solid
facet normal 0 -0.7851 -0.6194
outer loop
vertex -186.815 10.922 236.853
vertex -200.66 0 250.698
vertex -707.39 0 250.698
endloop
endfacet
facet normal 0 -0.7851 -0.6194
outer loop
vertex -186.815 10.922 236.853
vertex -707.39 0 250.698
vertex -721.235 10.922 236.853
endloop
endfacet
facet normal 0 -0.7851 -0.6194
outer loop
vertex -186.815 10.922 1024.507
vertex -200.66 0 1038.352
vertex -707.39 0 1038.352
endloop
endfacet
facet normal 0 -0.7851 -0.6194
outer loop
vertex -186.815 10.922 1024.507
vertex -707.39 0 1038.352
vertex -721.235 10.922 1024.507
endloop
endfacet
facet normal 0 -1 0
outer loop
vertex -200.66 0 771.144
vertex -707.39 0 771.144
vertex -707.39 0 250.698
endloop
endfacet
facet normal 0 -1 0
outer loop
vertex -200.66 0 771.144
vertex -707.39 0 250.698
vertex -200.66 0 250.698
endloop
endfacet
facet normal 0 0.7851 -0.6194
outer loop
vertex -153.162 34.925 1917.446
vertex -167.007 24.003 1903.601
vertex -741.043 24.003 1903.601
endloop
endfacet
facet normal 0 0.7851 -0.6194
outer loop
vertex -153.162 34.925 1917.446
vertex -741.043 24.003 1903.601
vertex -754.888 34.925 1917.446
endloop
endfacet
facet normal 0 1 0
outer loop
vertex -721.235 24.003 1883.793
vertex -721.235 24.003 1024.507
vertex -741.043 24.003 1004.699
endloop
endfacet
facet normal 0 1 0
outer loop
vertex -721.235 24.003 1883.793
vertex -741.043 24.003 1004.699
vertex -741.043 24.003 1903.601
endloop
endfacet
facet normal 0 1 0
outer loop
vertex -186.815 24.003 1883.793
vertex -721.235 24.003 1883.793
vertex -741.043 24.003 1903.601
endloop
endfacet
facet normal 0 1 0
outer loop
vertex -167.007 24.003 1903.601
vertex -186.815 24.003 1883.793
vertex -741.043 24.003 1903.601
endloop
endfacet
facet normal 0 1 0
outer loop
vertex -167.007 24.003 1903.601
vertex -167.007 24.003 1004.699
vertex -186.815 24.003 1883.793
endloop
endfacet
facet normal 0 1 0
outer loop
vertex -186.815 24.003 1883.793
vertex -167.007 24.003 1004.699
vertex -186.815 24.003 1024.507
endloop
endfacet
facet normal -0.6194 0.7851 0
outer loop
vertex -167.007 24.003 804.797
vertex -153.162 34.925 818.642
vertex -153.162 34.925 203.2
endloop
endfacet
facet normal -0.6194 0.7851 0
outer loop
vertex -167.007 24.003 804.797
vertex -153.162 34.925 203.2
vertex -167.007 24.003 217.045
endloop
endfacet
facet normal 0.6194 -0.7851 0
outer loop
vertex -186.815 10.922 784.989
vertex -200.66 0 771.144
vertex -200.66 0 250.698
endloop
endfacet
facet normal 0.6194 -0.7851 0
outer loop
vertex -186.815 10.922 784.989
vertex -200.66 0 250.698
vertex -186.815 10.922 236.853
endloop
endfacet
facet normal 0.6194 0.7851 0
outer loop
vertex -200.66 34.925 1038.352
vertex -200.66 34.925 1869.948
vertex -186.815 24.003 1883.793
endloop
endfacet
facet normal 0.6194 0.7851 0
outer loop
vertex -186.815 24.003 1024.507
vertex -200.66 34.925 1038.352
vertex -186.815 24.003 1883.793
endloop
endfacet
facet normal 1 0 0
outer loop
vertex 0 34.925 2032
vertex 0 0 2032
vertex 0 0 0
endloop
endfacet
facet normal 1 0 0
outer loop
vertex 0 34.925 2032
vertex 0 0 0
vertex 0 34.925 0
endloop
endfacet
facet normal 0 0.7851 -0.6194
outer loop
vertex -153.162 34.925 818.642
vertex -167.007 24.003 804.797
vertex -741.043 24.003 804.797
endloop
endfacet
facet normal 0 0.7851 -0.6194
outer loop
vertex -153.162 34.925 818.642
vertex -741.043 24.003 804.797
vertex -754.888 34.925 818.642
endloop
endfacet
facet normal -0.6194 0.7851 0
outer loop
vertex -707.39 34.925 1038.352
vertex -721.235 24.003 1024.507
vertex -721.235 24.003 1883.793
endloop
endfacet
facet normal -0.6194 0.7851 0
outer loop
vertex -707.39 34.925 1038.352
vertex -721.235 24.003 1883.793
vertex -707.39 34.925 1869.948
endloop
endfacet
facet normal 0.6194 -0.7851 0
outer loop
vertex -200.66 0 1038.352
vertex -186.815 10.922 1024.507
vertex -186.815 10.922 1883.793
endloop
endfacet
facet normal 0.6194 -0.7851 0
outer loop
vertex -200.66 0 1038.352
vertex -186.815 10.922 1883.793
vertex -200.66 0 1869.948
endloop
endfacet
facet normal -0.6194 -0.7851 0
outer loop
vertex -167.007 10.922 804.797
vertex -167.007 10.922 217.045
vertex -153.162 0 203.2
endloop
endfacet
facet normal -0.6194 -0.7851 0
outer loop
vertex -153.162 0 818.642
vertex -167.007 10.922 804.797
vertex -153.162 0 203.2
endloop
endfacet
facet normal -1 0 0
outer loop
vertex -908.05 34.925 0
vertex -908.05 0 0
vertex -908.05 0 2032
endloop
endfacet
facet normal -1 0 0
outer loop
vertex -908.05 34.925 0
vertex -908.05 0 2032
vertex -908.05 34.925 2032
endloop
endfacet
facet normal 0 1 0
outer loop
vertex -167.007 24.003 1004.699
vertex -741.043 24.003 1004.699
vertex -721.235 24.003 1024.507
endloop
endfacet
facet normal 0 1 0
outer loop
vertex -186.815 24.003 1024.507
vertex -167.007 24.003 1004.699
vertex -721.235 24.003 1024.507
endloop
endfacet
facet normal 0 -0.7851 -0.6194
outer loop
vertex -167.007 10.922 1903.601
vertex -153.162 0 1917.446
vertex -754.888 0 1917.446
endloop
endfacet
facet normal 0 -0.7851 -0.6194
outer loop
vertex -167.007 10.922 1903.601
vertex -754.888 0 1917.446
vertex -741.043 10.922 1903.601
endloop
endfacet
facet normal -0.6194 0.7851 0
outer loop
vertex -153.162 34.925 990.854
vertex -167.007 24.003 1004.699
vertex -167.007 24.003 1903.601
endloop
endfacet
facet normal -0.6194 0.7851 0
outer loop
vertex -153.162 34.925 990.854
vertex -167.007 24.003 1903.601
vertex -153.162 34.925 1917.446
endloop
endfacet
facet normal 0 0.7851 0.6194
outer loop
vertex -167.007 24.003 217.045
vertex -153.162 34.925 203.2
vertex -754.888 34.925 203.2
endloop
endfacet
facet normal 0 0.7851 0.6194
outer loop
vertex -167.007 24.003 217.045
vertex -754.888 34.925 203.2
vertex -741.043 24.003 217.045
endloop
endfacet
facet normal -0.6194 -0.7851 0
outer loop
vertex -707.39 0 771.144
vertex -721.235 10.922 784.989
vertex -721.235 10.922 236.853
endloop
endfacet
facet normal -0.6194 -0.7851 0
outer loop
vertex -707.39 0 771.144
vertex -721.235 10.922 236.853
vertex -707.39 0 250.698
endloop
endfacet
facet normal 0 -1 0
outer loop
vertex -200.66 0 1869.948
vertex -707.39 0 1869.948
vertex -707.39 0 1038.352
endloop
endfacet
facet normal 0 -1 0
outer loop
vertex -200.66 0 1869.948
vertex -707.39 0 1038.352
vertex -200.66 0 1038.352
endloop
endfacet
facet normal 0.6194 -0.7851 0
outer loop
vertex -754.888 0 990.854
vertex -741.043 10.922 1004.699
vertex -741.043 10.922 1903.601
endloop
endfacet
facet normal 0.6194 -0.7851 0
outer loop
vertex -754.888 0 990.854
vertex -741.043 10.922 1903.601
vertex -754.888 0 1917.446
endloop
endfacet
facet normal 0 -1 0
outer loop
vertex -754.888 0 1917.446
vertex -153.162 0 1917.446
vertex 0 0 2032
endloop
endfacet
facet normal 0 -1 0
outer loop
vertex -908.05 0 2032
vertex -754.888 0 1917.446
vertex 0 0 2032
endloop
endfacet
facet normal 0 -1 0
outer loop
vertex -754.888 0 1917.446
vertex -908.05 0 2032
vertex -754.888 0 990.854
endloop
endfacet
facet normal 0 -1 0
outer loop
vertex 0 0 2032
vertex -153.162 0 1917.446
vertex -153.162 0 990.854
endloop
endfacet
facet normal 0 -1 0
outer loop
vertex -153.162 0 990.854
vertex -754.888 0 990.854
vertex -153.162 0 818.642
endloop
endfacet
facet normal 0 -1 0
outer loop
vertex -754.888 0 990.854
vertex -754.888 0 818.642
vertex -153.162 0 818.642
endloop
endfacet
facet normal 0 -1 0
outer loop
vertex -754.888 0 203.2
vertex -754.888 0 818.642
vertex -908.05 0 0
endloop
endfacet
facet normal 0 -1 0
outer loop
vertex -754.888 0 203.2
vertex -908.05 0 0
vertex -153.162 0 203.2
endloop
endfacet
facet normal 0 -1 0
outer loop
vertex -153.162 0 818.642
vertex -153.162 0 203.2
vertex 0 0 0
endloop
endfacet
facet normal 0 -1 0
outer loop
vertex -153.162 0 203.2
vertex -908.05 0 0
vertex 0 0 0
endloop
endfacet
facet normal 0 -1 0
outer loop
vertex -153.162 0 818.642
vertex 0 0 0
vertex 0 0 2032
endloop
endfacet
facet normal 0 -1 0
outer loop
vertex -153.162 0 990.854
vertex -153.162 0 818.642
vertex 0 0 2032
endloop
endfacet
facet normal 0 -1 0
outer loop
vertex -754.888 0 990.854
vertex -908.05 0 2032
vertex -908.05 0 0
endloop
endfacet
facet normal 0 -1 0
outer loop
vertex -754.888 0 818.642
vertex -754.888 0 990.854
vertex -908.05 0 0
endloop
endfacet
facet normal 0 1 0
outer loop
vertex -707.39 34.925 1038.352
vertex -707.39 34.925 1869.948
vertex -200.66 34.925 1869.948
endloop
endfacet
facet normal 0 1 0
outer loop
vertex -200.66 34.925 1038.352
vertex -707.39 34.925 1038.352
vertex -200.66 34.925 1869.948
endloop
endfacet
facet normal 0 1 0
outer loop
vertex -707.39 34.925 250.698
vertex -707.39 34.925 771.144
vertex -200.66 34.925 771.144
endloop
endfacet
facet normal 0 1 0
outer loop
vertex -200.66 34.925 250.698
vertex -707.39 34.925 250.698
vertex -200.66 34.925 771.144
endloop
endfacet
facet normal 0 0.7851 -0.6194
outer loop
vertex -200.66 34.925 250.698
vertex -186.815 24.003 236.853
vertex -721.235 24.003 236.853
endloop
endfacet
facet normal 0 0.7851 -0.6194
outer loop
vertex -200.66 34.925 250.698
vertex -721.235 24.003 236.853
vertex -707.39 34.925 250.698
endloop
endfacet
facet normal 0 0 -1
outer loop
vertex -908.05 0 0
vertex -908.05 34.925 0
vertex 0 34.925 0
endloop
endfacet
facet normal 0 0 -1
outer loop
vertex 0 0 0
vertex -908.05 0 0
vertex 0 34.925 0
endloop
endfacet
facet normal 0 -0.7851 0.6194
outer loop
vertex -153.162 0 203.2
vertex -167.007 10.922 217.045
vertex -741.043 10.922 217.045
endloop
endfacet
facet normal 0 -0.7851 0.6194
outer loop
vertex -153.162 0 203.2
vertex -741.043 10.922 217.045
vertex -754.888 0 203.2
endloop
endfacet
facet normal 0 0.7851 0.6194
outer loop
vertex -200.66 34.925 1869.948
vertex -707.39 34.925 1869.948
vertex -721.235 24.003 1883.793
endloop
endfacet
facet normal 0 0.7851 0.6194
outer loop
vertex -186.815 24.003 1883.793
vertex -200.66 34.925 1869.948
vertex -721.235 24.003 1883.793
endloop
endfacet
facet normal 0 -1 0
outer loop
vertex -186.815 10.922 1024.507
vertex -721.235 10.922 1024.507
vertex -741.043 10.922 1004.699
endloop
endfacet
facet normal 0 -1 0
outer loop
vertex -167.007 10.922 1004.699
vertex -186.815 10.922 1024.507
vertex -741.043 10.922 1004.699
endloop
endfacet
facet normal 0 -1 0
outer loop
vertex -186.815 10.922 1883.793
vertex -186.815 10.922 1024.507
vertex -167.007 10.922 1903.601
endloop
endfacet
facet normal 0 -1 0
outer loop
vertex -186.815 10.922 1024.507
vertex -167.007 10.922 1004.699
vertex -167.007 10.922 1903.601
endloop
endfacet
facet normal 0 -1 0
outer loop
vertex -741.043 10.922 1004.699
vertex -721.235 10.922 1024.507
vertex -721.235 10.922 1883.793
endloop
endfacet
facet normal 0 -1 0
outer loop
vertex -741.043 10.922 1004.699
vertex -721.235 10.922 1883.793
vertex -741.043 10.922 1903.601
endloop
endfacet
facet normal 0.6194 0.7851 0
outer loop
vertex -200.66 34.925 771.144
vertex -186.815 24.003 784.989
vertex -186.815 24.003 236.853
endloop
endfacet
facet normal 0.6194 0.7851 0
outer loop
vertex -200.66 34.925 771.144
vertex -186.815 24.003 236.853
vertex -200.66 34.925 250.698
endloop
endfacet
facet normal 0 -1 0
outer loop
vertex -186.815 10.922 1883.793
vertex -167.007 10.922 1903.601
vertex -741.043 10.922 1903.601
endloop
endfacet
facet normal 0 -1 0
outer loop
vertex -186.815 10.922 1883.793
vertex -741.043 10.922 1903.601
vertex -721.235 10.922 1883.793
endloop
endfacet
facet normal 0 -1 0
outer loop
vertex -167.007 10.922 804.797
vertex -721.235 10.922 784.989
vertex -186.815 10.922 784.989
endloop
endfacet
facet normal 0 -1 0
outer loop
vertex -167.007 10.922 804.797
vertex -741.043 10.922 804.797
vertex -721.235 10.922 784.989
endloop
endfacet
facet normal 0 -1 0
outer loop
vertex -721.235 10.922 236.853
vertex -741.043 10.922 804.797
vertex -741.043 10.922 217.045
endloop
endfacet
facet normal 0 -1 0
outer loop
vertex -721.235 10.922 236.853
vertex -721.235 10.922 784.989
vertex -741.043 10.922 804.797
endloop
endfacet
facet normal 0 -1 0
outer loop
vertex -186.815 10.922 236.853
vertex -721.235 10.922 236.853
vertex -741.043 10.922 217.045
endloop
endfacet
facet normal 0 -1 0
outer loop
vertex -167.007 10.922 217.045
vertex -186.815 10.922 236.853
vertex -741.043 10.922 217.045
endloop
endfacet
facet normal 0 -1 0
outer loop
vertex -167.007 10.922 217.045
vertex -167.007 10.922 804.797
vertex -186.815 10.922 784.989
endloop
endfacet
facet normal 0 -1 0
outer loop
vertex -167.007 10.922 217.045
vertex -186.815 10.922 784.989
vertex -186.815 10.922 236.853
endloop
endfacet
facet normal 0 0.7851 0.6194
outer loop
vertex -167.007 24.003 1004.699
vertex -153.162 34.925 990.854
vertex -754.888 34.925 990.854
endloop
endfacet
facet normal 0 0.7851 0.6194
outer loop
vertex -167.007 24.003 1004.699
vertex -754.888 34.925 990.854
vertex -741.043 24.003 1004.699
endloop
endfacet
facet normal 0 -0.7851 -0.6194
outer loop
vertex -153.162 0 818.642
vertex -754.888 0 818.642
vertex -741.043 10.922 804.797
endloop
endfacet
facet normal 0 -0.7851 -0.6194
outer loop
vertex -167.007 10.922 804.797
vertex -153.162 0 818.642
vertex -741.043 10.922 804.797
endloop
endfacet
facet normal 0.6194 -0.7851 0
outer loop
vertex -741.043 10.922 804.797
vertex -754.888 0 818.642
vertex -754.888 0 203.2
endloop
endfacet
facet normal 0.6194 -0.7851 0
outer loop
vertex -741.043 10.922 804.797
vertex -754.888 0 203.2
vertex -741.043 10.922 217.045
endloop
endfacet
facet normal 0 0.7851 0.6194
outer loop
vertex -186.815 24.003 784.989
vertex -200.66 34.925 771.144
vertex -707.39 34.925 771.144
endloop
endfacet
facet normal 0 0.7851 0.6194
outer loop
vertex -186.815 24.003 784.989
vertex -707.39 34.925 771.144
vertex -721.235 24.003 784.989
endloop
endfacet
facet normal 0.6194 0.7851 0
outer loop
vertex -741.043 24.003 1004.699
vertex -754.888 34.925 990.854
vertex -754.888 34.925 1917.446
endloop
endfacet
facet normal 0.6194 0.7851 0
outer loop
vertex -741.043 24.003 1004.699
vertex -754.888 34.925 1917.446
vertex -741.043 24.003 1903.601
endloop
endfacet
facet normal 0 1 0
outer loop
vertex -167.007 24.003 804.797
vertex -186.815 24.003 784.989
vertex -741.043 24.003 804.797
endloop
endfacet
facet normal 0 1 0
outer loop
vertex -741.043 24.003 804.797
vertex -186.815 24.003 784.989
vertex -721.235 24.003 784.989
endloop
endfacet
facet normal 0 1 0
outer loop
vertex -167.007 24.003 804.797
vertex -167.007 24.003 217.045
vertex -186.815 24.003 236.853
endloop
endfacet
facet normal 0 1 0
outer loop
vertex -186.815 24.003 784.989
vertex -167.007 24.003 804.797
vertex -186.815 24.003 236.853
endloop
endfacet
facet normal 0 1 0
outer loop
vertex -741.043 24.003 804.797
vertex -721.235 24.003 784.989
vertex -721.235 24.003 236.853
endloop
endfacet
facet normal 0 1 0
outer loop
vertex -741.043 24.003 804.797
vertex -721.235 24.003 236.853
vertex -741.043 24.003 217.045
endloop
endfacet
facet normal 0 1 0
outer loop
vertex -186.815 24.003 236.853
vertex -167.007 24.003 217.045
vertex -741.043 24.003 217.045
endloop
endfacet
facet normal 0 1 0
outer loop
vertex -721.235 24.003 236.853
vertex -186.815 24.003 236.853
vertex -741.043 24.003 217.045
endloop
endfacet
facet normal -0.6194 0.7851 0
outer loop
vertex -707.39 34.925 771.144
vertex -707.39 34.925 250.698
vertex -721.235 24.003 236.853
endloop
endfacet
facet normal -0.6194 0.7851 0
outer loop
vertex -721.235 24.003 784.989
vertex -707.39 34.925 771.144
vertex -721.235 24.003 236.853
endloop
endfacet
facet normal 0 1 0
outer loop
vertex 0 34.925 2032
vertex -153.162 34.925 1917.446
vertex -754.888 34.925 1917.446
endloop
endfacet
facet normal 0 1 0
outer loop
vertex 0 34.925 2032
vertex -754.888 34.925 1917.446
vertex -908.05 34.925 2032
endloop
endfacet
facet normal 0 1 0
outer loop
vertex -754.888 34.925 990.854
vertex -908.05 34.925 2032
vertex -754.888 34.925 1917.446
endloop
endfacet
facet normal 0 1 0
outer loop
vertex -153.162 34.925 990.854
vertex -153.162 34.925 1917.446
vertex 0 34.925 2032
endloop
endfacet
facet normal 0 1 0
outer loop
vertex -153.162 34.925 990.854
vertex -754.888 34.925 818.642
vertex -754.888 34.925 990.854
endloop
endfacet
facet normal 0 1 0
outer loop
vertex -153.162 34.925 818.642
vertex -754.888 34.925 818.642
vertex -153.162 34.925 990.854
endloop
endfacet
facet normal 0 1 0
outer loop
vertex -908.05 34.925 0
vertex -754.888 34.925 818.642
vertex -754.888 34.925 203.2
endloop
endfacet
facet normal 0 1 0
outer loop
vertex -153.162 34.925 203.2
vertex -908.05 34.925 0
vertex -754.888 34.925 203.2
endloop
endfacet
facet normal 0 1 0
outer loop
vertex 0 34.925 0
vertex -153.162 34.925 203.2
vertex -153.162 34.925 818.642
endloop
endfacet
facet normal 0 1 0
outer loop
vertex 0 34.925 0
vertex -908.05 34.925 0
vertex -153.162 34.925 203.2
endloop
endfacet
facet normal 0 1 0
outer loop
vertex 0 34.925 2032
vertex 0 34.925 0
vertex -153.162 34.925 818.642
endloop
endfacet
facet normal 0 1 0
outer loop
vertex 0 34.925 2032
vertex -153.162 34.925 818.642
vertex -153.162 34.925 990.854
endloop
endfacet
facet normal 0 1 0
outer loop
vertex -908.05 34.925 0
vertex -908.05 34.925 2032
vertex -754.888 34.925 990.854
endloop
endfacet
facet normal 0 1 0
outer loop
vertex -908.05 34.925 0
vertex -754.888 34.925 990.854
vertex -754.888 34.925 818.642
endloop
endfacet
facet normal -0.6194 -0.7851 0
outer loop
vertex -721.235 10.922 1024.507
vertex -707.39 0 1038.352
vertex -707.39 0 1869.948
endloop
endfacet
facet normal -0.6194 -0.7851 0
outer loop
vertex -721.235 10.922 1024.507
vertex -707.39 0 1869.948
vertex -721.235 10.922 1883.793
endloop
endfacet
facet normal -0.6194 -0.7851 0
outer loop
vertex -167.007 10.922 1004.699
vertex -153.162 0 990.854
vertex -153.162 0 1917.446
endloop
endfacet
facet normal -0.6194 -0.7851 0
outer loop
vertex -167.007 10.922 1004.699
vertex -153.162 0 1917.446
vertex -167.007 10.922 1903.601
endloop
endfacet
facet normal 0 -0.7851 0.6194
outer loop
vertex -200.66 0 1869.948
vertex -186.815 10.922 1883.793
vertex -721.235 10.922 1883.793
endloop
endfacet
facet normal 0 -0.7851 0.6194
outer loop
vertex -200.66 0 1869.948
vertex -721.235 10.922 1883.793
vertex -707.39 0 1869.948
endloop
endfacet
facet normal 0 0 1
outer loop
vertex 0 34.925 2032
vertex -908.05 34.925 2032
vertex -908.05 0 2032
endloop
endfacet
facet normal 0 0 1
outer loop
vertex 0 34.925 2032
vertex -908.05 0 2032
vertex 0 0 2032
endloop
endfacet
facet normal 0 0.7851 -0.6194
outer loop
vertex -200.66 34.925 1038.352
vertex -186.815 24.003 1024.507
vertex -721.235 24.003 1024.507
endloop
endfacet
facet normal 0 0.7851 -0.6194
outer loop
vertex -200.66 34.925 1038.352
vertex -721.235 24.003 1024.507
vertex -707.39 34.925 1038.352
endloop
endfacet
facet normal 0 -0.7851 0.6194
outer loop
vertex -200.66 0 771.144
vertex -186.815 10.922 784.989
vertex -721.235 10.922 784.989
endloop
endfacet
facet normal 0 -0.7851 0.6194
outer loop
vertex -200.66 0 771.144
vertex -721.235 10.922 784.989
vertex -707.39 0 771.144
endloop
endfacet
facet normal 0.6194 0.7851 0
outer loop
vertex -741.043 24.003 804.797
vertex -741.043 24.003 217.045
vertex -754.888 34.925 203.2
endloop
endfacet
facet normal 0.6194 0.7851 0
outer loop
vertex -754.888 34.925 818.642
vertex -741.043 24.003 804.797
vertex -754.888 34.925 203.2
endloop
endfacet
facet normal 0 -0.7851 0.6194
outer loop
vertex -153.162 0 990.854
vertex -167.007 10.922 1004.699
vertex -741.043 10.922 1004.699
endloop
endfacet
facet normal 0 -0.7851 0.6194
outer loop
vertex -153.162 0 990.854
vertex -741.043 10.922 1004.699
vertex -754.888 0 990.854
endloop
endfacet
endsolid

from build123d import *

# Parameters (mm, degrees)
F0_W      = 908.05
F0_H      = 34.925
F1_DEPTH  = 2032
F2_W      = 601.726
F2_H      = 615.442
F3_DEPTH  = 34.926
F8_DEPTH  = 926.592
F9_DEPTH  = 615.442
F11_DEPTH = 34.926
F13_DEPTH = 908.05
F15_DEPTH = 34.926
F17_W     = 506.7300000006
F17_H     = 34.925
F18_DEPTH = 831.596
F19_W     = 506.7300000008
F19_H     = 34.925
F20_DEPTH = 520.446


with BuildPart() as f1:
    # F0 (on Top) → F1 (new body)
    with BuildSketch(Plane.XY):
        with Locations((-454.025, 17.4625)):
            Rectangle(F0_W, F0_H)
    extrude(amount=F1_DEPTH)

    # F2 (on Front) → F3 (cut, through all)
    with BuildSketch(Plane.XZ):
        Polygon((-754.888, 1917.446), (-754.888, 990.854), (-153.162, 990.854), (-153.162, 1917.446), (-454.025, 1917.446), align=None)
        with Locations((-454.025, 510.921)):
            Rectangle(F2_W, F2_H)
    extrude(amount=-F3_DEPTH, mode=Mode.SUBTRACT)

    # F6 (on face) → F8 (join, through all)
    with BuildSketch(Plane(origin=(0, 0, 1917.446), x_dir=(1, 0, 0), z_dir=(0, 0, -1))):
        Polygon((-200.66, -17.4625), (-200.66, -34.925), (-186.8149014921, -24.003), (-176.911, -24.003), (-167.0070985079, -24.003), (-153.162, -34.925), (-153.162, -17.4625), (-153.162, 0), (-167.0070985079, -10.922), (-176.911, -10.922), (-186.8149014921, -10.922), (-200.66, 0), align=None)
        Polygon((-741.0429014921, -24.003), (-731.139, -24.003), (-721.2350985079, -24.003), (-707.39, -34.925), (-707.39, -17.4625), (-707.39, 0), (-721.2350985079, -10.922), (-731.139, -10.922), (-741.0429014921, -10.922), (-754.888, 0), (-754.888, -17.4625), (-754.888, -34.925), align=None)
    extrude(amount=F8_DEPTH)

    # F7 (on face) → F9 (join, through all)
    with BuildSketch(Plane.XY.offset(203.2)):
        Polygon((-200.66, 34.925), (-200.66, 17.4625), (-200.66, 0), (-186.8149014921, 10.922), (-176.911, 10.922), (-167.0070985079, 10.922), (-153.162, 0), (-153.162, 17.4625), (-153.162, 34.925), (-167.0070985079, 24.003), (-176.911, 24.003), (-186.8149014921, 24.003), align=None)
        Polygon((-721.2350985079, 24.003), (-731.139, 24.003), (-741.0429014921, 24.003), (-754.888, 34.925), (-754.888, 17.4625), (-754.888, 0), (-741.0429014921, 10.922), (-731.139, 10.922), (-721.2350985079, 10.922), (-707.39, 0), (-707.39, 17.4625), (-707.39, 34.925), align=None)
    extrude(amount=F9_DEPTH)

    # F10 (on Front) → F11 (cut, through all)
    with BuildSketch(Plane.XZ):
        Polygon((-754.888, 1917.446), (-454.025, 1616.583), (-153.162, 1917.446), (-200.66, 1917.446), (-707.39, 1917.446), align=None)
        Polygon((-153.162, 990.854), (-454.025, 1291.717), (-754.888, 990.854), (-200.66, 990.854), align=None)
        Polygon((-153.162, 818.642), (-200.66, 818.642), (-707.39, 818.642), (-754.888, 818.642), (-454.025, 517.779), align=None)
        Polygon((-754.888, 203.2), (-200.66, 203.2), (-153.162, 203.2), (-454.025, 504.063), align=None)
    extrude(amount=-F11_DEPTH, mode=Mode.SUBTRACT)


with BuildPart() as f13:
    # F12 (on Right) → F13 (new body, through all)
    with BuildSketch(Plane.YZ):
        Polygon((34.925, 1917.446), (0, 1917.446), (10.9219999999, 1903.6009014923), (10.922, 1883.7930985079), (0, 1869.948), (34.925, 1869.948), (24.003, 1883.793098508), (24.003, 1903.6009014921), align=None)
    extrude(amount=-F13_DEPTH)


with BuildPart() as f13b:
    # F12 (on Right) → F13, piece 2 (new body, through all)
    with BuildSketch(Plane.YZ):
        Polygon((10.922, 1004.6990985079), (0, 990.854), (34.925, 990.854), (24.0029999999, 1004.6990985081), (24.003, 1024.5069014921), (34.925, 1038.3520000001), (0, 1038.352), (10.922, 1024.5069014922), align=None)
    extrude(amount=-F13_DEPTH)


with BuildPart() as f13c:
    # F12 (on Right) → F13, piece 3 (new body, through all)
    with BuildSketch(Plane.YZ):
        Polygon((24.003, 784.9890985079), (24.003, 804.7969014922), (34.925, 818.642), (0, 818.642), (10.922, 804.796901492), (10.922, 784.9890985079), (1e-10, 771.1440000001), (34.925, 771.144), align=None)
    extrude(amount=-F13_DEPTH)


with BuildPart() as f13d:
    # F12 (on Right) → F13, piece 4 (new body, through all)
    with BuildSketch(Plane.YZ):
        Polygon((34.925, 203.2), (24.003, 217.0450985079), (24.003, 236.852901492), (34.925, 250.698), (0, 250.698), (10.922, 236.8529014921), (10.922, 217.0450985078), (0, 203.2), align=None)
    extrude(amount=-F13_DEPTH)


with BuildPart() as f15_tool:
    # F14 (on Front) → F15 (new body, through all)
    with BuildSketch(Plane.XZ):
        Polygon((-754.888, 818.642), (-754.888, 203.2), (-454.025, 504.063), (-153.162, 203.2), (-153.162, 818.642), (-454.025, 517.779), align=None)
        Polygon((-153.162, 1917.446), (-454.025, 1616.583), (-754.888, 1917.446), (-754.888, 990.854), (-454.025, 1291.717), (-153.162, 990.854), align=None)
    extrude(amount=-F15_DEPTH)


with BuildPart() as f13_1:
    add(f13.part)

    # F15: cut by f15_tool
    add(f15_tool.part, mode=Mode.SUBTRACT)


with BuildPart() as f13b_1:
    add(f13b.part)

    # F15: cut by f15_tool
    add(f15_tool.part, mode=Mode.SUBTRACT)


with BuildPart() as f13c_1:
    add(f13c.part)

    # F15: cut by f15_tool
    add(f15_tool.part, mode=Mode.SUBTRACT)


with BuildPart() as f13d_1:
    add(f13d.part)

    # F15: cut by f15_tool
    add(f15_tool.part, mode=Mode.SUBTRACT)


with BuildPart() as f1_1:
    add(f1.part)

    # F16: union F13, F13b, F13c, F13d
    add(f13_1.part)
    add(f13b_1.part)
    add(f13c_1.part)
    add(f13d_1.part)

    # F17 (on face) → F18 (join, through all)
    with BuildSketch(Plane.XY.offset(1038.352)):
        with Locations((-454.0250000003, 17.4625)):
            Rectangle(F17_W, F17_H)
    extrude(amount=F18_DEPTH)

    # F19 (on face) → F20 (join, through all)
    with BuildSketch(Plane.XY.offset(250.698)):
        with Locations((-454.0250000004, 17.4625)):
            Rectangle(F19_W, F19_H)
    extrude(amount=F20_DEPTH)


solid = f1_1.part
